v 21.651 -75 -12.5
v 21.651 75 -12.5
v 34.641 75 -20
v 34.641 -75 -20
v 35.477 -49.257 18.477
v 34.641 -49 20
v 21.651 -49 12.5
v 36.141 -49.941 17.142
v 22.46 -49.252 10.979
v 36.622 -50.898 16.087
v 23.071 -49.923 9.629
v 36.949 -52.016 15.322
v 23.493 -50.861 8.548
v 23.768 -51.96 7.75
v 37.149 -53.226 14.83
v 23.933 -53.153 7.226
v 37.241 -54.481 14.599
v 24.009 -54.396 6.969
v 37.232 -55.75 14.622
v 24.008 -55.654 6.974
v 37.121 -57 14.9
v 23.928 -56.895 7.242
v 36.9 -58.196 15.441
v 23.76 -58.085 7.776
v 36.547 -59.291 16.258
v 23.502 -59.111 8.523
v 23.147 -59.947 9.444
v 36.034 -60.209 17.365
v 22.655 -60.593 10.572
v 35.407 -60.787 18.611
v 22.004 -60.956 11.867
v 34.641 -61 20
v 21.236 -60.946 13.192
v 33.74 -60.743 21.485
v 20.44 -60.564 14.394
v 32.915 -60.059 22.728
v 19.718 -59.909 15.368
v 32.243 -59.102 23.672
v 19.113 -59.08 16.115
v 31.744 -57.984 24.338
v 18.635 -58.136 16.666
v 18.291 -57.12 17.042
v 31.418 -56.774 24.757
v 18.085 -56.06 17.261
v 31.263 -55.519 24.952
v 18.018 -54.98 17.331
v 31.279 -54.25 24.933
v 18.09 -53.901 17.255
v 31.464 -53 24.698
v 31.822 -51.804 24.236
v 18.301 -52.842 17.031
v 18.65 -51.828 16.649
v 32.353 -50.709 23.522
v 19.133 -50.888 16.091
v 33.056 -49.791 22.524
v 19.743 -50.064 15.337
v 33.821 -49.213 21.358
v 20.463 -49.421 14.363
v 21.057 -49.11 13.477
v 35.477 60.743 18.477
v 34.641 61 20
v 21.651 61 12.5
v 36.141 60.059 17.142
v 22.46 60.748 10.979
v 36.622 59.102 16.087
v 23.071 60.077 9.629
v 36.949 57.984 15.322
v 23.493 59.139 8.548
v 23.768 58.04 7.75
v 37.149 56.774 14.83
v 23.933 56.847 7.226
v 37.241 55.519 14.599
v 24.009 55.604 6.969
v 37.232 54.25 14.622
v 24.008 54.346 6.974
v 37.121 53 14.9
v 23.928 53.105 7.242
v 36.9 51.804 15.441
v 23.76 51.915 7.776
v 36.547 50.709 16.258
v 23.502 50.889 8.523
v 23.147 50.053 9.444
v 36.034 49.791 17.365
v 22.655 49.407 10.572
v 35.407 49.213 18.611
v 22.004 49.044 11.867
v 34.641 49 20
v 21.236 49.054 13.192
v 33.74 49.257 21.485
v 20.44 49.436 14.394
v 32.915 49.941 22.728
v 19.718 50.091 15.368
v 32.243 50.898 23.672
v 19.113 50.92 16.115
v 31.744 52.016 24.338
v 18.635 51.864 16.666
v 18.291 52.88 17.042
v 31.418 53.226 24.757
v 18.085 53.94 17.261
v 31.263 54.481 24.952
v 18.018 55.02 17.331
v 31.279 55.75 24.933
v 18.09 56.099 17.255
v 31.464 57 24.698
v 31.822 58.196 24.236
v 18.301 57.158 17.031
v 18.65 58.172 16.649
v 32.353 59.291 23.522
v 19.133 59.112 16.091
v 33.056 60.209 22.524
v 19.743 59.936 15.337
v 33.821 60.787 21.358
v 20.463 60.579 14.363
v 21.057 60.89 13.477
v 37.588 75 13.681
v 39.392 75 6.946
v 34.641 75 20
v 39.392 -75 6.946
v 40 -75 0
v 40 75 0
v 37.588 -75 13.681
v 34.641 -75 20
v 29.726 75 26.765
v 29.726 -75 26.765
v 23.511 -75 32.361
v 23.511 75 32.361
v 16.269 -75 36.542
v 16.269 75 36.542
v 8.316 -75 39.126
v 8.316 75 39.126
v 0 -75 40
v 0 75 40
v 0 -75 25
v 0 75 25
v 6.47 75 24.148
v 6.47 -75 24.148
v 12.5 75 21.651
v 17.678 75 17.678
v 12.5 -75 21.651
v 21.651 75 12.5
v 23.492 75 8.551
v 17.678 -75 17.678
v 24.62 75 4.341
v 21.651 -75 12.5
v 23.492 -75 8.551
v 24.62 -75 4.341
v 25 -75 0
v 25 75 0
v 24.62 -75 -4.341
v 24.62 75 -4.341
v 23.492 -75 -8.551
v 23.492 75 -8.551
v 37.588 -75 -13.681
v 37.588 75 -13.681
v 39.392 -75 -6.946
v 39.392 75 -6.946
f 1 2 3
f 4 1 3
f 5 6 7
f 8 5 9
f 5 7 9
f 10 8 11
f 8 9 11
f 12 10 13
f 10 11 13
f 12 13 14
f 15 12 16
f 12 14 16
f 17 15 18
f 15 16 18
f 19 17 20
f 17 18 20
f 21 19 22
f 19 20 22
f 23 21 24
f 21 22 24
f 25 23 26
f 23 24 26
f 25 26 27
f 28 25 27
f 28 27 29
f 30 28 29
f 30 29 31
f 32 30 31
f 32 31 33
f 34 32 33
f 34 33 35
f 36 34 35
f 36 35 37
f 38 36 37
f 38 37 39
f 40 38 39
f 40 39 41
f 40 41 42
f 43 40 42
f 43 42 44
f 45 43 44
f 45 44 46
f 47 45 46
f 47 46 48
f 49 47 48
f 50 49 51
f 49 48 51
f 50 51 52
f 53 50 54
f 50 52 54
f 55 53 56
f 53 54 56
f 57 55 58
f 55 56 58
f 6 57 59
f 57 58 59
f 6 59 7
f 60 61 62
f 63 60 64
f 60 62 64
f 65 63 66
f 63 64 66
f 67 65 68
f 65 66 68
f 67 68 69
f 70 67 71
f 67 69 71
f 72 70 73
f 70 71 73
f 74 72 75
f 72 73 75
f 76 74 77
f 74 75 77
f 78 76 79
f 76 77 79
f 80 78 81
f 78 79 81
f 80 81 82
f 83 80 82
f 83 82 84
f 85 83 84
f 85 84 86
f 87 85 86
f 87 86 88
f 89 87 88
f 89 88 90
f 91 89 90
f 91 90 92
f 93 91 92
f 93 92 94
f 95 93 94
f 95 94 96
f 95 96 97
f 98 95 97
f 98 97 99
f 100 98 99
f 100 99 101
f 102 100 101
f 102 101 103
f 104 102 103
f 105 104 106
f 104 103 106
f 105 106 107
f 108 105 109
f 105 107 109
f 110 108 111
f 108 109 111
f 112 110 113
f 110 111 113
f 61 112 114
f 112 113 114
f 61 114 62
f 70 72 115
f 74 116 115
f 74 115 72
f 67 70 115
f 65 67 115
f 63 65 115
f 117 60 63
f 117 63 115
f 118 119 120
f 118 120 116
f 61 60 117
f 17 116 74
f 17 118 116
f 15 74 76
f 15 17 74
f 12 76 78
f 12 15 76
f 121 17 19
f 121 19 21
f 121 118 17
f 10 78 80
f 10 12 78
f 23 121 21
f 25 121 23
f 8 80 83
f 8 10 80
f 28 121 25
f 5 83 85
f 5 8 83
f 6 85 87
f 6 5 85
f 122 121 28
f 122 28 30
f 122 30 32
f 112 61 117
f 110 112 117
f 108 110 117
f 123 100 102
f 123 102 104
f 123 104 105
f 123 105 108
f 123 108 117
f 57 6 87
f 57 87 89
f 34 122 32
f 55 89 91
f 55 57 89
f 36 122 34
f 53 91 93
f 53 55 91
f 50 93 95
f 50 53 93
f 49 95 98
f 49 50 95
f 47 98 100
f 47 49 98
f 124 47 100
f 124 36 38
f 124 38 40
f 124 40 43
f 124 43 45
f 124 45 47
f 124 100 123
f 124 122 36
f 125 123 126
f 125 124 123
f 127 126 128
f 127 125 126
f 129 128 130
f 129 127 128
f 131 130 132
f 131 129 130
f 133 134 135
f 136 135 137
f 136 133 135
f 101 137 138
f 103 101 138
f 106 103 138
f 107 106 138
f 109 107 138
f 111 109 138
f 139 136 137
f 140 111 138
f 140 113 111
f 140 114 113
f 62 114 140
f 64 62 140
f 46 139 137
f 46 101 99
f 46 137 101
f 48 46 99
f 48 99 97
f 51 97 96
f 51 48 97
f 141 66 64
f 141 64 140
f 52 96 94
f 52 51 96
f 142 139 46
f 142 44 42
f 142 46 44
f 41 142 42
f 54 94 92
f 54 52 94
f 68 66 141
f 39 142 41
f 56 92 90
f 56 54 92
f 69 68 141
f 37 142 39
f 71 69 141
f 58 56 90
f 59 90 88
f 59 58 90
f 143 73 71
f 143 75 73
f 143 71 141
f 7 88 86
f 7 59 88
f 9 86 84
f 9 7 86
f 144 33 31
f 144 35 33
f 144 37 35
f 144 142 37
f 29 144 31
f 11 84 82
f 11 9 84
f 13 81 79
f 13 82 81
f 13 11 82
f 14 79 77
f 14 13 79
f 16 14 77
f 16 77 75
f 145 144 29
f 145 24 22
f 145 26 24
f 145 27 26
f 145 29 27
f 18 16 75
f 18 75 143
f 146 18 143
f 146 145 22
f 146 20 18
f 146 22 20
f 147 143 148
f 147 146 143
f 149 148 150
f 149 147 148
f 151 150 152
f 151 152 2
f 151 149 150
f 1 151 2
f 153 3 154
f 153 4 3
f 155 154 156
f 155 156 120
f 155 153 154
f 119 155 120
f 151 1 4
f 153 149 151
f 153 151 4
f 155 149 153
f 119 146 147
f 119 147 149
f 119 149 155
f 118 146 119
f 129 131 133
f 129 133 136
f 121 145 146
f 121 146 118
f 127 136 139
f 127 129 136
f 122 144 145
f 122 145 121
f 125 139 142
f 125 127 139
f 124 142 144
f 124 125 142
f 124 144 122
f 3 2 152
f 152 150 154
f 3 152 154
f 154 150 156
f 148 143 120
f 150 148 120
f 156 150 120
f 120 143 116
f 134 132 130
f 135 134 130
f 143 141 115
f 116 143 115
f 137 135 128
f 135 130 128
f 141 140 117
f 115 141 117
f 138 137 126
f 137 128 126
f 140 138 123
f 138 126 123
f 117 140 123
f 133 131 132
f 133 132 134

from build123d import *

# Parameters (mm, degrees)
F1_DEPTH = 75
F5_D     = 12


with BuildPart() as f1:
    # F0 (on Front) → F1 (new body, symmetric)
    with BuildSketch(Plane.XZ):
        with BuildLine():
            Line((21.6506350946, 12.5), (34.6410161514, 20))
            ThreePointArc((34.6410161514, 20), (20, 34.6410161514), (0, 40))
            Line((0, 40), (0, 25))
            ThreePointArc((0, 25), (12.5, 21.6506350946), (21.6506350946, 12.5))
        make_face()
        with BuildLine():
            ThreePointArc((34.6410161514, -20), (38.6370330516, -10.3527618041), (40, 0))
            ThreePointArc((40, 0), (38.6370330516, 10.3527618041), (34.6410161514, 20))
            Line((34.6410161514, 20), (21.6506350946, 12.5))
            ThreePointArc((21.6506350946, 12.5), (24.1481456572, 6.4704761276), (25, 0))
            ThreePointArc((25, 0), (24.1481456572, -6.4704761276), (21.6506350946, -12.5))
            Line((21.6506350946, -12.5), (34.6410161514, -20))
        make_face()
    extrude(amount=F1_DEPTH, both=True)

    # F5 (through all)
    with Locations(Plane(origin=(34.6410161514, 0, 20), x_dir=(0, -1, 0), z_dir=(0.8660254038, 0, 0.5))):
        with Locations((55, 0), (-55, 0)):
            Hole(F5_D / 2)


solid = f1.part
